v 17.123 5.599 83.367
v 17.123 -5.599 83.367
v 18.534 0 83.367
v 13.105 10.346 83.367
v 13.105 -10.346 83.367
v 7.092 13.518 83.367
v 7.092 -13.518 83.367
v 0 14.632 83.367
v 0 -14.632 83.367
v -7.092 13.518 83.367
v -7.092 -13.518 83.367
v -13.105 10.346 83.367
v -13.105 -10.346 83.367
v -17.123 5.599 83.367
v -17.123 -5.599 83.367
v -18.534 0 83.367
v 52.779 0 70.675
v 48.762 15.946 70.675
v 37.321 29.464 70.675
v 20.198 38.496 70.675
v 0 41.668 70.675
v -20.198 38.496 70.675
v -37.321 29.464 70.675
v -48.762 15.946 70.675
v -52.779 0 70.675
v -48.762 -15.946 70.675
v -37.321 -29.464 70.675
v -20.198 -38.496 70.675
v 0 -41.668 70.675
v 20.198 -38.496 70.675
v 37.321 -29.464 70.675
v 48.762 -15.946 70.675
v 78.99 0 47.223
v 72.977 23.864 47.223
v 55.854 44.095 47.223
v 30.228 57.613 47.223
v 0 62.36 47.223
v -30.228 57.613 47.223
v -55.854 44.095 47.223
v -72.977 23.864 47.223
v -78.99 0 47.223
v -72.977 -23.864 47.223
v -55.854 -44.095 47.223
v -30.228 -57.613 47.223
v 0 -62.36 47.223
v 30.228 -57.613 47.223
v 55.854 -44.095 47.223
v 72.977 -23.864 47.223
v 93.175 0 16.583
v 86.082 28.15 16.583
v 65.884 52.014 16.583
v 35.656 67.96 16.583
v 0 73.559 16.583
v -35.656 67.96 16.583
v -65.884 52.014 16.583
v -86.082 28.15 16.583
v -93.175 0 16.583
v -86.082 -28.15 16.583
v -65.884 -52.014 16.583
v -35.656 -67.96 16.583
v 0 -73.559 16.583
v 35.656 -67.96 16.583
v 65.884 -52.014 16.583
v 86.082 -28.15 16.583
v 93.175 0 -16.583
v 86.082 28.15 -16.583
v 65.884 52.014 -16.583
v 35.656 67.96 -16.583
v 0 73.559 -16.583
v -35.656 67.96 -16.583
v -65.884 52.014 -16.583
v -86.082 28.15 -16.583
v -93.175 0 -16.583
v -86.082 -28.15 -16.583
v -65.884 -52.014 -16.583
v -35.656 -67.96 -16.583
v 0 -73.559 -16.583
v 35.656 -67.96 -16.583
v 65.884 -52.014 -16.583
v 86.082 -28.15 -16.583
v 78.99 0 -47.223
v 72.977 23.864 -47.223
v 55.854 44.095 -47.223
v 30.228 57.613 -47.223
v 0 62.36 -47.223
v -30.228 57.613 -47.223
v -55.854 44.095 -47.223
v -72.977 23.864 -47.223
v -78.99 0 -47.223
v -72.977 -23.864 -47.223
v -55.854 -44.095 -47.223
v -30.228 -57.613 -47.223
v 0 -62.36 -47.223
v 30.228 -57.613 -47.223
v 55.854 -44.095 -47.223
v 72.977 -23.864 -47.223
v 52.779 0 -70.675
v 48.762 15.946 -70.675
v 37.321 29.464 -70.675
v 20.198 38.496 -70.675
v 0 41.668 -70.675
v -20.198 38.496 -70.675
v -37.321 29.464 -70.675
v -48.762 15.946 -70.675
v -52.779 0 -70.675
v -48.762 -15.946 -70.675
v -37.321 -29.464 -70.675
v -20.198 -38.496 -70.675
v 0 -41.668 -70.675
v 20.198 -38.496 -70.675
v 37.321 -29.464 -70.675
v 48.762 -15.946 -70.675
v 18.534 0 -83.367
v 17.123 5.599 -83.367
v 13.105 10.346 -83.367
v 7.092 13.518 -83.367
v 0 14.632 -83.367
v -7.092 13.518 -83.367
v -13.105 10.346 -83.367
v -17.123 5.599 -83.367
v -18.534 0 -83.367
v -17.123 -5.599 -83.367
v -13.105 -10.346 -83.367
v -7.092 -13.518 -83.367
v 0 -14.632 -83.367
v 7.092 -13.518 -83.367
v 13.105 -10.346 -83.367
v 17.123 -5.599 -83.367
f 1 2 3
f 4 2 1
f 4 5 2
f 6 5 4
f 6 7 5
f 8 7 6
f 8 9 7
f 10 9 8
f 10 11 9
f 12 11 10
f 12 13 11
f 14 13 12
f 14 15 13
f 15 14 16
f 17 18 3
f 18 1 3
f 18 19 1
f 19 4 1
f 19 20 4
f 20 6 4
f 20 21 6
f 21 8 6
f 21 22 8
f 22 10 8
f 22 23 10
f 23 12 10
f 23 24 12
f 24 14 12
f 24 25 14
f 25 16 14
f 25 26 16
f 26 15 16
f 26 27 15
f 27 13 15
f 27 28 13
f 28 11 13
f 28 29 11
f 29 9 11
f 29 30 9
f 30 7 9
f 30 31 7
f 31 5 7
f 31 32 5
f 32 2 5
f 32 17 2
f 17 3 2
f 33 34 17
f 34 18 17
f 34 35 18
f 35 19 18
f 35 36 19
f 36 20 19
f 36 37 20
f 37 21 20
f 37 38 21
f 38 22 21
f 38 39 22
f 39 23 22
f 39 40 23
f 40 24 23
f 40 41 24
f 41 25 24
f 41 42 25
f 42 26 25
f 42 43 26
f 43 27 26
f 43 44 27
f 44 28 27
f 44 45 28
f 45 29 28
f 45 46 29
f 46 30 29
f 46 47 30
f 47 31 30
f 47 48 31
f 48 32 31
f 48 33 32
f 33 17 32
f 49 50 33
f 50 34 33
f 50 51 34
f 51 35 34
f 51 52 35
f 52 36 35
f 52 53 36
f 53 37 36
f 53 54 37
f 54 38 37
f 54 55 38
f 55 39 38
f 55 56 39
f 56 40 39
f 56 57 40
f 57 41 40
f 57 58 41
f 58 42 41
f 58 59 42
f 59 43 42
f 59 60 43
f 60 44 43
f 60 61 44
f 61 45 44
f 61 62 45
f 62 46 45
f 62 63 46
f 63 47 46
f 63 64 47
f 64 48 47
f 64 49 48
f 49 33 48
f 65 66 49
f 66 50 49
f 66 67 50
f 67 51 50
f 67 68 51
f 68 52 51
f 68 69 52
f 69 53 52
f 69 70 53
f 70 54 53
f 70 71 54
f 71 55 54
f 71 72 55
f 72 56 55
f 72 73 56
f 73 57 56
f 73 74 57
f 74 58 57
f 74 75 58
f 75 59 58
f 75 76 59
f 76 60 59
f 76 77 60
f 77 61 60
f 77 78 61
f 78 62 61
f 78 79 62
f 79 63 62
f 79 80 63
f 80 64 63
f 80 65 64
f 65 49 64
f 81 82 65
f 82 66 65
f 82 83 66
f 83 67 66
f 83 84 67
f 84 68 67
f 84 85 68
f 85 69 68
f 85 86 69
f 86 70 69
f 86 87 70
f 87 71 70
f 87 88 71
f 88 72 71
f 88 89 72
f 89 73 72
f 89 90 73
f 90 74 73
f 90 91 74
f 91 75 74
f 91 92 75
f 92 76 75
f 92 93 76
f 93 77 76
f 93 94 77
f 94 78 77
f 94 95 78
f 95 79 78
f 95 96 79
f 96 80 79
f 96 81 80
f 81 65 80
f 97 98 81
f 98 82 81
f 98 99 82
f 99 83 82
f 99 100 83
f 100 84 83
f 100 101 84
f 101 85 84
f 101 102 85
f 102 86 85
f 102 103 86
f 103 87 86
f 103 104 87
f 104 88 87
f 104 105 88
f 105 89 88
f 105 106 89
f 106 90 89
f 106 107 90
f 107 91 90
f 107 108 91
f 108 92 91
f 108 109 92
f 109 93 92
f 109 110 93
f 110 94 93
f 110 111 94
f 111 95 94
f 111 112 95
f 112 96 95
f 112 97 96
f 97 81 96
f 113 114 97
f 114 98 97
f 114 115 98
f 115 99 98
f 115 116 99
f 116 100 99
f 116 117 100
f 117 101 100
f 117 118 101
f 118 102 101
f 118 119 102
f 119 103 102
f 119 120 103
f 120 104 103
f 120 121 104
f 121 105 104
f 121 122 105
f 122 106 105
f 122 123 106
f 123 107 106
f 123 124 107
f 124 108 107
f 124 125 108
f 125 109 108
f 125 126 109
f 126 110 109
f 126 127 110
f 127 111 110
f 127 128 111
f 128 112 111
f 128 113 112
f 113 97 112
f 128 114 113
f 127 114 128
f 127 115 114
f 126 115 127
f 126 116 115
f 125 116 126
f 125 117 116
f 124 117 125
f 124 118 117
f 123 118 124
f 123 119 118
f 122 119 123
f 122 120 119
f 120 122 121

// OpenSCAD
// Generated by SolidPython 1.0.1 on 2020-07-29 00:46:54


scale(v = [19, 15, 17]) {
	sphere(r = 5);
}
/***********************************************
*********      SolidPython code:      **********
************************************************
 
# import packages: SolidPython
from solid import *
from solid.utils import *
from itertools import chain, combinations, permutations


class Resize:

    def __init__(self, scad_file):
        self.scad_file = scad_file
        #self.scad_file = import_scad(scad_file)
        # cone/cylinder param:
        self.r1 = 0
        self.r2 = 0
        self.h = 0
        # rectangular prism param:
        self.w = 0
        self.l = 0
        # ellipse param:
        self.r = 0

    # import OpenScad code (file name corresponds to shape)


    # classify shape + parameters
    def assign(self, param1, param2, param3):
        if self.scad_file == 'cone.scad':
            self.r1 = param1
            self.r2 = param2
            self.h = param3
        elif self.scad_file == 'cylinder.scad':
            self.r1 = param1
            self.r2 = param2
            self.h = param3
        elif self.scad_file == 'rectangularPrism.scad':
            self.h = param1
            self.l = param2
            self.w = param3
        else:
            self.r = param1
            self.h = param2

    # resize parameters
    def iterate(self):
        x = range(3, 20, 2)
        i = 1
        if self.scad_file == 'cone.scad':
            tempList = list(permutations(x, 2))
            for temp in tempList:
                param1 = temp[0]
                param2 = temp[1]
                filepath = 'produced_scad_files/' + 'cone' + str(param1) + '_' + str(param2) + '_' + '.scad'
                scad_render_to_file(cylinder(h=param1, r1=param2, r2=0), filepath)

        elif self.scad_file == 'cylinder.scad':
            tempList = list(permutations(x, 3))
            for temp in tempList:
                param1 = temp[0]
                param2 = temp[1]
                filepath = 'produced_scad_files/' + 'cylinder' + str(param1) + '_' + str(param2) + '_' + '.scad'
                scad_render_to_file(cylinder(h=param1, r1=param2, r2=param2), filepath)

        elif self.scad_file == 'rectangularPrism.scad':
            tempList = list(permutations(x, 3))
            for temp in tempList:
                param1 = temp[0]
                param2 = temp[1]
                param3 = temp[2]
                filepath = 'produced_scad_files/' + 'rectangularPrism' + str(param1) + '_' + str(param2) + '_' + str(
                    param3) + '.scad'
                scad_render_to_file(cube(size=(param1, param2, param3)), filepath)

        elif self.scad_file == 'ellipse.scad':
            tempList = list(permutations(x, 4))
            for temp in tempList:
                param1 = temp[0]
                param2 = temp[1]
                param3 = temp[2]
                param4 = temp[3]
                filepath = 'produced_scad_files/' + 'ellipse' + str(param1) + '_' + str(param2) + '_' + str(param3) + '_' + str(param4) + '.scad'
                scad_render_to_file(scale([param1, param2, param3])(sphere(r=param4)), filepath)

    def render_to_scadfile(self):
        scad_render_to_file(scad, 'example.scad') 
 
************************************************/
